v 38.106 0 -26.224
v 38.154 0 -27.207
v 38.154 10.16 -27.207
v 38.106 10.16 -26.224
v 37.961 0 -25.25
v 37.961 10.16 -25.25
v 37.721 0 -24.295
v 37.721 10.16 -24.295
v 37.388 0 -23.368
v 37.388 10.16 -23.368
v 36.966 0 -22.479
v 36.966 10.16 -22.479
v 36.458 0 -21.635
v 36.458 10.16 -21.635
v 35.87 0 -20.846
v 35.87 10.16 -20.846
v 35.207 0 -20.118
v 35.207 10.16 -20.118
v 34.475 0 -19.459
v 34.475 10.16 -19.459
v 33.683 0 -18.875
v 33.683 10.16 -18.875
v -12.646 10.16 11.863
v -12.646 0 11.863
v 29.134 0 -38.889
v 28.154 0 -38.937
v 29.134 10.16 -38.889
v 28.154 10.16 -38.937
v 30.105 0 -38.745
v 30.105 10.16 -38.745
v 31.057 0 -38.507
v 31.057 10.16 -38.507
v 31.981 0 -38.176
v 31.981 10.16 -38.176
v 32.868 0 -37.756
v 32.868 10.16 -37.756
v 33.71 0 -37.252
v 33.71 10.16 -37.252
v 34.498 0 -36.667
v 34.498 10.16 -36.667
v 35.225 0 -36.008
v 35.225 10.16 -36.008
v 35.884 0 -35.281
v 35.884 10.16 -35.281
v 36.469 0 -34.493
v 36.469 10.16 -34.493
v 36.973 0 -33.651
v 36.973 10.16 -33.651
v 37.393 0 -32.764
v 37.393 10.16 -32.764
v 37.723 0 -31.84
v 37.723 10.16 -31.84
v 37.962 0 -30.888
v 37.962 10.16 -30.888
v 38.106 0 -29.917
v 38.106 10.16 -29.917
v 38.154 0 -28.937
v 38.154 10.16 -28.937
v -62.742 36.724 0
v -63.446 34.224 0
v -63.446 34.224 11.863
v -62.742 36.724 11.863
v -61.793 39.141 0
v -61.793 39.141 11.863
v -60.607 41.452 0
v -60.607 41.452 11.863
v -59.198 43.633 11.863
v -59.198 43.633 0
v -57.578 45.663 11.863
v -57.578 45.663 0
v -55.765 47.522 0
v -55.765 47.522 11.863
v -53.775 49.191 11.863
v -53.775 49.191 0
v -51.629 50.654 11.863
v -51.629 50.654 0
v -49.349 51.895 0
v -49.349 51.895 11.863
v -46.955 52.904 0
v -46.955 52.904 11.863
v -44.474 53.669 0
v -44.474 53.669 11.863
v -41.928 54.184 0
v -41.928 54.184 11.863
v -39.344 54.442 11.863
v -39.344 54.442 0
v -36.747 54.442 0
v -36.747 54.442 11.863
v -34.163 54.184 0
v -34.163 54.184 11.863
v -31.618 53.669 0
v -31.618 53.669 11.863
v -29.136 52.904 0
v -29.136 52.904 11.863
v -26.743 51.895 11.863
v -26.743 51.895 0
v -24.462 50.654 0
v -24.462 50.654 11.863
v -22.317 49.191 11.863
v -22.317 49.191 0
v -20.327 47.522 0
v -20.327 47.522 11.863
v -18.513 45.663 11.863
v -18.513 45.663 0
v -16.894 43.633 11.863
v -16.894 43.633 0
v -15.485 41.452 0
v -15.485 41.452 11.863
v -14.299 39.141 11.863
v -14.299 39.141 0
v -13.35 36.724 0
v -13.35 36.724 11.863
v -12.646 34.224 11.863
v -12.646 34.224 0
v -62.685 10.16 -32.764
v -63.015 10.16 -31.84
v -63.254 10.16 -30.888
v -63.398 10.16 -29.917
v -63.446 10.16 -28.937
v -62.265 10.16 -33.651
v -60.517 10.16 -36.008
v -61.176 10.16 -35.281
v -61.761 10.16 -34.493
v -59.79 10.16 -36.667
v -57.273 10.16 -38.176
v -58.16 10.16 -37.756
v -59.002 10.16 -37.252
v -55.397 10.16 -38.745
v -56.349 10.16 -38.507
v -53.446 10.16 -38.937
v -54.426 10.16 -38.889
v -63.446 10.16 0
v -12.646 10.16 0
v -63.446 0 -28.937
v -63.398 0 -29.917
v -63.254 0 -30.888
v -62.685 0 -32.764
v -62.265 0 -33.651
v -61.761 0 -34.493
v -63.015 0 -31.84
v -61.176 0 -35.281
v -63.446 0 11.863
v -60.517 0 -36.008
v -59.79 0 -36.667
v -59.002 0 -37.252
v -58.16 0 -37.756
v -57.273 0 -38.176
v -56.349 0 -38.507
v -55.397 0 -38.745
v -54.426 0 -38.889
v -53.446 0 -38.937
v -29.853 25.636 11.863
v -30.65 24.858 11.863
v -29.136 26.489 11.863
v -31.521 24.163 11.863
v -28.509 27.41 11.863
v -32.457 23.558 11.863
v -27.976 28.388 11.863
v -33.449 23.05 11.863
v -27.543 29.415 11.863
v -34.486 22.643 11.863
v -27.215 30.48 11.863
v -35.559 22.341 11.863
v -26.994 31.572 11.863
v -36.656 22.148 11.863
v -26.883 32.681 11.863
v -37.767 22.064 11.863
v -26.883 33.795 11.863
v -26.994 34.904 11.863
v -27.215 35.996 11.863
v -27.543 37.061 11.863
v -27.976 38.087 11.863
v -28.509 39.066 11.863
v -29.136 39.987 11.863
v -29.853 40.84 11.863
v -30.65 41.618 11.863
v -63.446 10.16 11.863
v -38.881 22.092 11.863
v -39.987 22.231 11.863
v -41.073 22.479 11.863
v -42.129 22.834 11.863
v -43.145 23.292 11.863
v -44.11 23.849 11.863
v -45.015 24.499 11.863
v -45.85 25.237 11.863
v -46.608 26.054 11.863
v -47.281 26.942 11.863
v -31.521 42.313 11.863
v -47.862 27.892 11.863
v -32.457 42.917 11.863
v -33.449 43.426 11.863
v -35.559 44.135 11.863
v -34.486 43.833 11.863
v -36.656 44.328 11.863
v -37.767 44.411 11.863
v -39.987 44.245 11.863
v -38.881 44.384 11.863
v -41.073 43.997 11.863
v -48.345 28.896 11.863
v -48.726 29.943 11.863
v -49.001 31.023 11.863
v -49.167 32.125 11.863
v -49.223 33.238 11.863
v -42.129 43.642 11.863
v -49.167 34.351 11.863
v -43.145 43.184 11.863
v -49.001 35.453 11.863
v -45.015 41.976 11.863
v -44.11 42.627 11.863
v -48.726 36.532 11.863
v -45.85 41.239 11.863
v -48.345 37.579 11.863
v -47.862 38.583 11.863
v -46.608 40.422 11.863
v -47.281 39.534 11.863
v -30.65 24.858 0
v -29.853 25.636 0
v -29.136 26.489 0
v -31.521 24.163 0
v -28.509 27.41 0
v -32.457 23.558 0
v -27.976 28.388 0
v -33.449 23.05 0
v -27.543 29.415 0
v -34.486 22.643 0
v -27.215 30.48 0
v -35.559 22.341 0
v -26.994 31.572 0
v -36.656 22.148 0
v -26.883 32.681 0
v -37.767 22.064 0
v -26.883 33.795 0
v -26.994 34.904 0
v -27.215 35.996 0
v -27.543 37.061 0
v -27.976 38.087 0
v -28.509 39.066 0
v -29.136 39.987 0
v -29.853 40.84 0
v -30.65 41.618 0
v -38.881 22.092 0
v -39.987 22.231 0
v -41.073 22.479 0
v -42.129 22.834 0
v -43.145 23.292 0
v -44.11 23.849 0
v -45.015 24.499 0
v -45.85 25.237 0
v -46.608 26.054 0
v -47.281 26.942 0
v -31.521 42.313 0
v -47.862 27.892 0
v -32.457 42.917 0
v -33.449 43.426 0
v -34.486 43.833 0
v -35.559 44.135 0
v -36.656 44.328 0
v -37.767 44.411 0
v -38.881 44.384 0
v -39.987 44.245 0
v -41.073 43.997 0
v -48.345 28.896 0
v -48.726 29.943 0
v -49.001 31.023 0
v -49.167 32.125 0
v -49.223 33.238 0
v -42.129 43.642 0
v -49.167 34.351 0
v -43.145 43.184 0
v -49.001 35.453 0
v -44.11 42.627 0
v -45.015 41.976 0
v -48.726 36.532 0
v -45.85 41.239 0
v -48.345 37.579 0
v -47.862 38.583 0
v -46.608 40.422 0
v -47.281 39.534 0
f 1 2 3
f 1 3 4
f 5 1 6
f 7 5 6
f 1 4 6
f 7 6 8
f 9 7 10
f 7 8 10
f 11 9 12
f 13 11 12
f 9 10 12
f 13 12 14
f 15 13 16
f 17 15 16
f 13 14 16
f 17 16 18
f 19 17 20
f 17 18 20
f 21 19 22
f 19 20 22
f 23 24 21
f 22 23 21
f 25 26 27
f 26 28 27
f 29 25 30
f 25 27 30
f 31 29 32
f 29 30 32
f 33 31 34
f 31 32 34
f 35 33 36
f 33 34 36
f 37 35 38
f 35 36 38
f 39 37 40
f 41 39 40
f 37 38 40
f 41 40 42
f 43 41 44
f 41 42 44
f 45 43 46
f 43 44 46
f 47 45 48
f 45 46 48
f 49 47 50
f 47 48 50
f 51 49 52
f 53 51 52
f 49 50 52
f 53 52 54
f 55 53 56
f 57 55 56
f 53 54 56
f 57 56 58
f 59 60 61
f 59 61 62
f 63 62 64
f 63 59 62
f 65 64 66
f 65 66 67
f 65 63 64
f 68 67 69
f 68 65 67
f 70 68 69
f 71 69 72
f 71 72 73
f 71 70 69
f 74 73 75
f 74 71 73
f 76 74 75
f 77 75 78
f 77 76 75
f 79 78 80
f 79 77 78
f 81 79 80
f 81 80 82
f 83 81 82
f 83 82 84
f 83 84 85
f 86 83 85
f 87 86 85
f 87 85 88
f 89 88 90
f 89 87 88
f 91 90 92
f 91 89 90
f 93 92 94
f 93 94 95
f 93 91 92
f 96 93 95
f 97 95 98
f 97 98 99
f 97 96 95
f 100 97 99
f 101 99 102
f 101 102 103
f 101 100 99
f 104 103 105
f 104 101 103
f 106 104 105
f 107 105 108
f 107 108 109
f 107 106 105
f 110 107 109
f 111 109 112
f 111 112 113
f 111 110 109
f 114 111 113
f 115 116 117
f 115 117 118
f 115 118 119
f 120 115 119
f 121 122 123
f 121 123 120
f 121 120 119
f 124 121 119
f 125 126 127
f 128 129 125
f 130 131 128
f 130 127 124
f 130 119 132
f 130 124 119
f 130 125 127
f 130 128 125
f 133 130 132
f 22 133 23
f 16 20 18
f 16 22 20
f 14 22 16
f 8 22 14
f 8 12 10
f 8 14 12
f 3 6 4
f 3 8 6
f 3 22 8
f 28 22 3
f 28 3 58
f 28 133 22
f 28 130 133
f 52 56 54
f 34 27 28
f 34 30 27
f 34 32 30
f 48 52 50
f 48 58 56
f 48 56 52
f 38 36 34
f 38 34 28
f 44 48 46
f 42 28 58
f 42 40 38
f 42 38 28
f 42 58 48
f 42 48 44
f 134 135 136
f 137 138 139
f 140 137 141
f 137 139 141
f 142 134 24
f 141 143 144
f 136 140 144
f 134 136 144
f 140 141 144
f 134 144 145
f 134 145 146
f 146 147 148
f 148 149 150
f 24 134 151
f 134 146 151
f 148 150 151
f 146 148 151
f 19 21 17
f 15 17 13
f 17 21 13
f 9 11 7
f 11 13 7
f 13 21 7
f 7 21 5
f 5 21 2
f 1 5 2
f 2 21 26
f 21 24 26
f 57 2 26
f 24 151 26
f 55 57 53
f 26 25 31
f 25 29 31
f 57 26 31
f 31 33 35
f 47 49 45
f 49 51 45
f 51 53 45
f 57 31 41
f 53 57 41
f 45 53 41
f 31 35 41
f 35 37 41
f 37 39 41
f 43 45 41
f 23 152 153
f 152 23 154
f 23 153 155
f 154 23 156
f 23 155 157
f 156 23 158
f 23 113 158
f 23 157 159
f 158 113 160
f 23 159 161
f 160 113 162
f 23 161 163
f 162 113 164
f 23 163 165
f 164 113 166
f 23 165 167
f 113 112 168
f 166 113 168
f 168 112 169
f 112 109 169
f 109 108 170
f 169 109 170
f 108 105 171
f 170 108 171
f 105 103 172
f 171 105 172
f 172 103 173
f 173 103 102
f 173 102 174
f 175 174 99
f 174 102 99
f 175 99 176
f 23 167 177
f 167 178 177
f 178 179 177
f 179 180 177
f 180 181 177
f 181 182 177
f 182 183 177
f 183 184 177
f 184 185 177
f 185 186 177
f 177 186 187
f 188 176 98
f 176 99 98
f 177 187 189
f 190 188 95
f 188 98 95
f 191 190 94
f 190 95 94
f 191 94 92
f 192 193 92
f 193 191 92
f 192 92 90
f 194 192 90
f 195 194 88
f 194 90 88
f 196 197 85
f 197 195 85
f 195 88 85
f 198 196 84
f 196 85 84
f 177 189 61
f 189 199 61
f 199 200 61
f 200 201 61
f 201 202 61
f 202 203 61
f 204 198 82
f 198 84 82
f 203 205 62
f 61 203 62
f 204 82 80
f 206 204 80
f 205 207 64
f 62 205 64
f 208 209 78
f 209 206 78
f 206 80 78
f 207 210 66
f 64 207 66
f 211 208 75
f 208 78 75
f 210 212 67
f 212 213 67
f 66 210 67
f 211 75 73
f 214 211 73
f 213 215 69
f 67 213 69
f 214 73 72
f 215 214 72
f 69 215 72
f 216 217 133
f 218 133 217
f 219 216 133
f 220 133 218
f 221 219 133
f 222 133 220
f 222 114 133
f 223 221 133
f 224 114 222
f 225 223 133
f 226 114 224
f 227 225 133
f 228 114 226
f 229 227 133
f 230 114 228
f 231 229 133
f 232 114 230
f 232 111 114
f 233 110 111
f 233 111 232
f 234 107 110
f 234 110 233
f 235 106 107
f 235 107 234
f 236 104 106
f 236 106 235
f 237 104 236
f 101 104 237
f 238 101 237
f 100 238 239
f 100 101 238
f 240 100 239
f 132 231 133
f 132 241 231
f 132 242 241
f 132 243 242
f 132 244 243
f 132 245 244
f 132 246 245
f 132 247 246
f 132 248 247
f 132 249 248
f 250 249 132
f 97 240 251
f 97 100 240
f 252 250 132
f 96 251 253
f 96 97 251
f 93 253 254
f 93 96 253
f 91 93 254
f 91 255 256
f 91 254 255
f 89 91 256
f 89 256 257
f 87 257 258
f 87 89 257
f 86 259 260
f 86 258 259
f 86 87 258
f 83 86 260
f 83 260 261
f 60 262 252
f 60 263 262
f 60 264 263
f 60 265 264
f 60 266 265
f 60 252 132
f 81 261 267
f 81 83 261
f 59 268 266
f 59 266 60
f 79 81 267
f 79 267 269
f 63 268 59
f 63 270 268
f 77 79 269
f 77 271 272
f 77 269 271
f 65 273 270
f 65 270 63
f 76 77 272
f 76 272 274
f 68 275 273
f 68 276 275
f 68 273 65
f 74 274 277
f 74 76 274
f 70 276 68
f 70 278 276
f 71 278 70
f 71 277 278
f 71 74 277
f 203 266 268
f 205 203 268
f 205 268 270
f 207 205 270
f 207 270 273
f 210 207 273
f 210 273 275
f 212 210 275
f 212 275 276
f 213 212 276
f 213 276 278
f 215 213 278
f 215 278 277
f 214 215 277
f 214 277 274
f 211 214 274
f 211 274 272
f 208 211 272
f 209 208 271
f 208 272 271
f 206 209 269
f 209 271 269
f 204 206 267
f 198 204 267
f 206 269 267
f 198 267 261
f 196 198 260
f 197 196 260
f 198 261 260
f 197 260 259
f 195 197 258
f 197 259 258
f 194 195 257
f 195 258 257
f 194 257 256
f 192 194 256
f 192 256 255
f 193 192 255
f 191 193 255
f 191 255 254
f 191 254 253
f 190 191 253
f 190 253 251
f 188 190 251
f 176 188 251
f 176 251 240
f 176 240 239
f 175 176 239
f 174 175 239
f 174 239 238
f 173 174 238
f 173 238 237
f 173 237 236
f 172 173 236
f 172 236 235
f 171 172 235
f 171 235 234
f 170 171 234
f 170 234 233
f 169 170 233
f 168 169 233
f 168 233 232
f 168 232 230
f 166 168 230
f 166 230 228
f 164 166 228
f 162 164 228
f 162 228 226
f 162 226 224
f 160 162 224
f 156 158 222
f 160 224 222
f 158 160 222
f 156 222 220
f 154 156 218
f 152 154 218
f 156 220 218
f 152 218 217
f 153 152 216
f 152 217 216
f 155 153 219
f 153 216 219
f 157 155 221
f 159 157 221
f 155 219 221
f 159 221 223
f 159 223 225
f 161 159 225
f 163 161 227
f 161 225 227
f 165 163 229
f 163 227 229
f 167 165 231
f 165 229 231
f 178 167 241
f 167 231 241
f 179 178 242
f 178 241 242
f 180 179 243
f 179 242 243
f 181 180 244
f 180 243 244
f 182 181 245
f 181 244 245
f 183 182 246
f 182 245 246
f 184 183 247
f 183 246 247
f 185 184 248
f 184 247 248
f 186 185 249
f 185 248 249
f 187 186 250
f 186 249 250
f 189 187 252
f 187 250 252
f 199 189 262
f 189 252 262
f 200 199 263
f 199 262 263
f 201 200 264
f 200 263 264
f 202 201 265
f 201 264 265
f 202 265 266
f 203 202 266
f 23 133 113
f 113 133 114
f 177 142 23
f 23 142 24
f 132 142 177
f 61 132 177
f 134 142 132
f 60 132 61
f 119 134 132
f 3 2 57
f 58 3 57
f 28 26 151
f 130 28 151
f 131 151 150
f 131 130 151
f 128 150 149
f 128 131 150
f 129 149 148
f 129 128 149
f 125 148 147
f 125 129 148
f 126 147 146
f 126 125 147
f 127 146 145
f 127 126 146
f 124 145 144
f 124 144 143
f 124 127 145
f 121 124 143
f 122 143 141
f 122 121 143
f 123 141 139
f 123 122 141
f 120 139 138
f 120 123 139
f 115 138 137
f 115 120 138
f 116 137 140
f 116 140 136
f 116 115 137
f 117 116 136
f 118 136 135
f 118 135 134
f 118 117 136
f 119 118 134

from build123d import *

# Parameters (mm, degrees)
BOSS_EXTRUDE1_DEPTH = 10.16
SKETCH3_W           = 50.8
SKETCH3_H           = 24.064486013
BOSS_EXTRUDE2_DEPTH = 11.8629
SKETCH4_R           = 11.176966962
CUT_EXTRUDE2_DEPTH  = 12.862900188
FILLET1_R           = 10
FILLET2_R           = 10
FILLET3_R           = 10


with BuildPart() as part:
    # Sketch1 → Boss-Extrude1 (new body)
    with BuildSketch(Plane(origin=(0, 0, 0), x_dir=(1, 0, 0), z_dir=(0, 1, 0))):
        Polygon((38.154070096, 38.937099812), (-63.445929904, 38.937099812), (-63.445929904, -11.862900188), (-12.645929904, -11.862900188), (38.154070096, 21.8411914), align=None)
    extrude(amount=BOSS_EXTRUDE1_DEPTH)

    # Sketch3 → Boss-Extrude2 (add)
    with BuildSketch(Plane.XY):
        with BuildLine():
            ThreePointArc((-63.445929904, 34.224486013), (-38.045929904, 54.474648718), (-12.645929904, 34.224486013))
            Line((-12.645929904, 34.224486013), (-63.445929904, 34.224486013))
        make_face()
        with Locations((-38.045929904, 22.192243007)):
            Rectangle(SKETCH3_W, SKETCH3_H)
    extrude(amount=BOSS_EXTRUDE2_DEPTH)

    # Sketch4 → Cut-Extrude2 (cut, through all)
    with BuildSketch(Plane(origin=(0, 0, 0), x_dir=(-1, 0, 0), z_dir=(0, 0, -1))):
        with Locations((38.045929904, 33.23792349)):
            Circle(SKETCH4_R)
    extrude(amount=-CUT_EXTRUDE2_DEPTH, mode=Mode.SUBTRACT)

    # Fillet1
    fillet1_edges = [part.edges().sort_by_distance(p)[0] for p in [
        (38.154070096, 5.08, -38.937099812),
    ]]
    fillet(fillet1_edges, radius=FILLET1_R)

    # Fillet2
    fillet2_edges = [part.edges().sort_by_distance(p)[0] for p in [
        (38.154070096, 5.08, -21.8411914),
    ]]
    fillet(fillet2_edges, radius=FILLET2_R)

    # Fillet3
    fillet3_edges = [part.edges().sort_by_distance(p)[0] for p in [
        (-63.445929904, 5.08, -38.937099812),
    ]]
    fillet(fillet3_edges, radius=FILLET3_R)


solid = part.part
